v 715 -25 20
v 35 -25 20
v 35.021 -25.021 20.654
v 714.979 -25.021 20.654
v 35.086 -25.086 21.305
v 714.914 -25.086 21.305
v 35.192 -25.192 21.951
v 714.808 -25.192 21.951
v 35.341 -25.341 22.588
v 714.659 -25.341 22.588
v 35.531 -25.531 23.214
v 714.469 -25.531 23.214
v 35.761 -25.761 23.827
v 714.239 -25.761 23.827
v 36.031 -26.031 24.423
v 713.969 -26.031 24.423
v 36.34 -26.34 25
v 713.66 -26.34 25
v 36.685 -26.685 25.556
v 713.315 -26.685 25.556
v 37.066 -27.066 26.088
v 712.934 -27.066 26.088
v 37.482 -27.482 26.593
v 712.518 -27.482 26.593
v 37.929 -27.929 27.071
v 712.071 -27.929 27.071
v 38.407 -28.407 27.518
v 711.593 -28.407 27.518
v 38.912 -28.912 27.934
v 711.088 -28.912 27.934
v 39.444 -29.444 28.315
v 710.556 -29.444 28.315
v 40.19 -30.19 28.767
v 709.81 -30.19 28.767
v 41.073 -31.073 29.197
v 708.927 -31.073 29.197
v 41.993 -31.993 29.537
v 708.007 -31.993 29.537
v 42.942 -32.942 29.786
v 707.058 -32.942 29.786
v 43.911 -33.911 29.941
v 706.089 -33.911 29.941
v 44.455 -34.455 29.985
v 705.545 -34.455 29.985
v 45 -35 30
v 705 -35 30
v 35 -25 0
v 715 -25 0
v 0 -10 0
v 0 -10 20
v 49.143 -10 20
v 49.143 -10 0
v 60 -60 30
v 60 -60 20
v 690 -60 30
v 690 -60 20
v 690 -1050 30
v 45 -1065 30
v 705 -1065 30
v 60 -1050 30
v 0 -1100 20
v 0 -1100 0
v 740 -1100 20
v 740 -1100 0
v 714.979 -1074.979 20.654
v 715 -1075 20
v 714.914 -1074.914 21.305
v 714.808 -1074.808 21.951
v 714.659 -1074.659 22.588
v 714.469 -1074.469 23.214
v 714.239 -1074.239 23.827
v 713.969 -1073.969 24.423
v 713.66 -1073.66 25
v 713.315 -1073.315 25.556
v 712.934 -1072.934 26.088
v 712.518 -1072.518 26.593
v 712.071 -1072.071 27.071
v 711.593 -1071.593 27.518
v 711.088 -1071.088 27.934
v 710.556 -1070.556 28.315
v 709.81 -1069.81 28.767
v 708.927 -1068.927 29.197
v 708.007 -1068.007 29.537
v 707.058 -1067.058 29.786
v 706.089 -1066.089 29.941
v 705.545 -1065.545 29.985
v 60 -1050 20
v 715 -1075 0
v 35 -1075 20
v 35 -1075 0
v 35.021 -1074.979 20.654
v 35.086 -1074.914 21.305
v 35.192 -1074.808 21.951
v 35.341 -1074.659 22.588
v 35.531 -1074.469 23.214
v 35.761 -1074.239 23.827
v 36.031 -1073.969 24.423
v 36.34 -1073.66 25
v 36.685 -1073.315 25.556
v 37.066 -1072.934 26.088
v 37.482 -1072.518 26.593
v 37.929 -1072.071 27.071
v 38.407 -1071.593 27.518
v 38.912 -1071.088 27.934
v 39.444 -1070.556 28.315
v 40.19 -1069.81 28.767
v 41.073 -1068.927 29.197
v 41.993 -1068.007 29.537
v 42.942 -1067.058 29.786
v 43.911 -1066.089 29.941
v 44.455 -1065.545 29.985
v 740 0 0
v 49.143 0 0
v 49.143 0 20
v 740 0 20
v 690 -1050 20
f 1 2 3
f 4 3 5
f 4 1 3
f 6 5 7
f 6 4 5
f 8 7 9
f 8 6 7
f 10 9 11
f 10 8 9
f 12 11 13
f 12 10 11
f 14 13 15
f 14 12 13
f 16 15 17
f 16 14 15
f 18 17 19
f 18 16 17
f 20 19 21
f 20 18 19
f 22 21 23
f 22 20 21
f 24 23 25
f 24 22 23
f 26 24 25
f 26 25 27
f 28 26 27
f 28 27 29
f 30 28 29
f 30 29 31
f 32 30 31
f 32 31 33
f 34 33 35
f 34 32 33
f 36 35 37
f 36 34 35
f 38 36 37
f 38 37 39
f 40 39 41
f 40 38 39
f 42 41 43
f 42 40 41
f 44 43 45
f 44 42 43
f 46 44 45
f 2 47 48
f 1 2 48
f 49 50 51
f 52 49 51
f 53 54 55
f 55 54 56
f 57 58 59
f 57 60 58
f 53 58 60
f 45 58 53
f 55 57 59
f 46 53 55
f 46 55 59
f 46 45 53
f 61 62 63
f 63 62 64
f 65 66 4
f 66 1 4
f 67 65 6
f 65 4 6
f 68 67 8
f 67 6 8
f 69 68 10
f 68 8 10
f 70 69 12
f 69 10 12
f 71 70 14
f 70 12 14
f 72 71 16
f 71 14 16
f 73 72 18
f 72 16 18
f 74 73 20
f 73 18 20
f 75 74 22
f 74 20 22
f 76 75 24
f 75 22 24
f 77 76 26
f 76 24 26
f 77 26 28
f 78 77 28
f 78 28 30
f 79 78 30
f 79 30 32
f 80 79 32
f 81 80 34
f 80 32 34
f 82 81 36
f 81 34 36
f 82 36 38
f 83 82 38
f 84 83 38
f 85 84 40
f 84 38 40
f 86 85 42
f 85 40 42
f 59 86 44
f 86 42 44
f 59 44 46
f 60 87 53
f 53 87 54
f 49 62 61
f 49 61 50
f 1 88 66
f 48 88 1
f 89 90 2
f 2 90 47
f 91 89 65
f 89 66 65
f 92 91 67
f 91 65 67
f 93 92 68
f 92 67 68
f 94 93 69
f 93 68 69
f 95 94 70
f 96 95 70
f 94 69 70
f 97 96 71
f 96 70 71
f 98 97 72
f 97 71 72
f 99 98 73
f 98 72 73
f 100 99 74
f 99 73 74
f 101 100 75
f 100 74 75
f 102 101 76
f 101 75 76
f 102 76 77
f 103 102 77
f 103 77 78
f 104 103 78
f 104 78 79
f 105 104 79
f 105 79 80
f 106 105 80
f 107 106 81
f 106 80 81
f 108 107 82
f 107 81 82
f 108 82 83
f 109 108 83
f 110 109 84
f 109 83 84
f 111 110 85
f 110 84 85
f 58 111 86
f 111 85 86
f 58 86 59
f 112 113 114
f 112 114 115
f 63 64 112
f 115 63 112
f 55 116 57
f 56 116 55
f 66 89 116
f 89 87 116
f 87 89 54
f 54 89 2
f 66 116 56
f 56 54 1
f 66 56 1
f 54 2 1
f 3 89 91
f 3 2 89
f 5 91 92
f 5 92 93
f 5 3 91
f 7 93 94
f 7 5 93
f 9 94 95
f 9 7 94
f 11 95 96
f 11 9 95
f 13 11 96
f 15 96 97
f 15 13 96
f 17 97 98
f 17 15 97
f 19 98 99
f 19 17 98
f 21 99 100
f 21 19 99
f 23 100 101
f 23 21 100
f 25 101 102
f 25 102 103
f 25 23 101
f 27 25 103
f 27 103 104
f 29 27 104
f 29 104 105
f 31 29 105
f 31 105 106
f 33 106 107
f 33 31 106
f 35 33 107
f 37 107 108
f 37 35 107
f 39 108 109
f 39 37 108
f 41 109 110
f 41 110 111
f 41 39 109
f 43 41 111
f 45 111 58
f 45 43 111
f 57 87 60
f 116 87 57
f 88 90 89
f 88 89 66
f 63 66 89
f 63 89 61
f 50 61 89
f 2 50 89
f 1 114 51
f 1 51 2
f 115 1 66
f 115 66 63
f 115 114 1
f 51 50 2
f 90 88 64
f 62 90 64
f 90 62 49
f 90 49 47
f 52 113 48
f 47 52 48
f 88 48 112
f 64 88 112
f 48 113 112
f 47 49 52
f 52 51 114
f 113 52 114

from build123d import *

# Parameters (mm, degrees)
ESBO_O2_W                = 740
ESBO_O2_H                = 1100
ESBO_O2_W_2              = 680
ESBO_O2_H_2              = 1050
RESSALTO_EXTRUS_O1_DEPTH = 20
ESBO_O3_W                = 680
ESBO_O3_H                = 1050
ESBO_O3_W_2              = 630
ESBO_O3_H_2              = 990
RESSALTO_EXTRUS_O2_DEPTH = 10
FILETE1_R                = 10
ESBO_O4_W                = 49.143238
ESBO_O4_H                = 10
CORTE_EXTRUS_O1_DEPTH    = 20


with BuildPart() as part:
    # Esboço2 → Ressalto-extrusão1 (new body)
    with BuildSketch(Plane.XY):
        with Locations((370, -550)):
            Rectangle(ESBO_O2_W, ESBO_O2_H)
        with Locations((375, -550)):
            Rectangle(ESBO_O2_W_2, ESBO_O2_H_2, mode=Mode.SUBTRACT)
    extrude(amount=RESSALTO_EXTRUS_O1_DEPTH)

    # Esboço4 → Corte-extrusão1 (cut)
    with BuildSketch(Plane.XY.offset(20)):
        with Locations((24.571619, -5)):
            Rectangle(ESBO_O4_W, ESBO_O4_H)
    extrude(amount=-CORTE_EXTRUS_O1_DEPTH, mode=Mode.SUBTRACT)


with BuildPart() as body_2:
    # Esboço3 → Ressalto-extrusão2 (new body)
    with BuildSketch(Plane.XY.offset(20)):
        with Locations((375, -550)):
            Rectangle(ESBO_O3_W, ESBO_O3_H)
        with Locations((375, -555)):
            Rectangle(ESBO_O3_W_2, ESBO_O3_H_2, mode=Mode.SUBTRACT)
    extrude(amount=RESSALTO_EXTRUS_O2_DEPTH)

    # Filete1
    filete1_edges = [body_2.edges().sort_by_distance(p)[0] for p in [
        (715, -550, 30),
        (375, -25, 30),
        (35, -550, 30),
        (375, -1075, 30),
    ]]
    fillet(filete1_edges, radius=FILETE1_R - 0.0001)  # a hair under: the kernel refuses the full size


solid = Compound([part.part, body_2.part])
